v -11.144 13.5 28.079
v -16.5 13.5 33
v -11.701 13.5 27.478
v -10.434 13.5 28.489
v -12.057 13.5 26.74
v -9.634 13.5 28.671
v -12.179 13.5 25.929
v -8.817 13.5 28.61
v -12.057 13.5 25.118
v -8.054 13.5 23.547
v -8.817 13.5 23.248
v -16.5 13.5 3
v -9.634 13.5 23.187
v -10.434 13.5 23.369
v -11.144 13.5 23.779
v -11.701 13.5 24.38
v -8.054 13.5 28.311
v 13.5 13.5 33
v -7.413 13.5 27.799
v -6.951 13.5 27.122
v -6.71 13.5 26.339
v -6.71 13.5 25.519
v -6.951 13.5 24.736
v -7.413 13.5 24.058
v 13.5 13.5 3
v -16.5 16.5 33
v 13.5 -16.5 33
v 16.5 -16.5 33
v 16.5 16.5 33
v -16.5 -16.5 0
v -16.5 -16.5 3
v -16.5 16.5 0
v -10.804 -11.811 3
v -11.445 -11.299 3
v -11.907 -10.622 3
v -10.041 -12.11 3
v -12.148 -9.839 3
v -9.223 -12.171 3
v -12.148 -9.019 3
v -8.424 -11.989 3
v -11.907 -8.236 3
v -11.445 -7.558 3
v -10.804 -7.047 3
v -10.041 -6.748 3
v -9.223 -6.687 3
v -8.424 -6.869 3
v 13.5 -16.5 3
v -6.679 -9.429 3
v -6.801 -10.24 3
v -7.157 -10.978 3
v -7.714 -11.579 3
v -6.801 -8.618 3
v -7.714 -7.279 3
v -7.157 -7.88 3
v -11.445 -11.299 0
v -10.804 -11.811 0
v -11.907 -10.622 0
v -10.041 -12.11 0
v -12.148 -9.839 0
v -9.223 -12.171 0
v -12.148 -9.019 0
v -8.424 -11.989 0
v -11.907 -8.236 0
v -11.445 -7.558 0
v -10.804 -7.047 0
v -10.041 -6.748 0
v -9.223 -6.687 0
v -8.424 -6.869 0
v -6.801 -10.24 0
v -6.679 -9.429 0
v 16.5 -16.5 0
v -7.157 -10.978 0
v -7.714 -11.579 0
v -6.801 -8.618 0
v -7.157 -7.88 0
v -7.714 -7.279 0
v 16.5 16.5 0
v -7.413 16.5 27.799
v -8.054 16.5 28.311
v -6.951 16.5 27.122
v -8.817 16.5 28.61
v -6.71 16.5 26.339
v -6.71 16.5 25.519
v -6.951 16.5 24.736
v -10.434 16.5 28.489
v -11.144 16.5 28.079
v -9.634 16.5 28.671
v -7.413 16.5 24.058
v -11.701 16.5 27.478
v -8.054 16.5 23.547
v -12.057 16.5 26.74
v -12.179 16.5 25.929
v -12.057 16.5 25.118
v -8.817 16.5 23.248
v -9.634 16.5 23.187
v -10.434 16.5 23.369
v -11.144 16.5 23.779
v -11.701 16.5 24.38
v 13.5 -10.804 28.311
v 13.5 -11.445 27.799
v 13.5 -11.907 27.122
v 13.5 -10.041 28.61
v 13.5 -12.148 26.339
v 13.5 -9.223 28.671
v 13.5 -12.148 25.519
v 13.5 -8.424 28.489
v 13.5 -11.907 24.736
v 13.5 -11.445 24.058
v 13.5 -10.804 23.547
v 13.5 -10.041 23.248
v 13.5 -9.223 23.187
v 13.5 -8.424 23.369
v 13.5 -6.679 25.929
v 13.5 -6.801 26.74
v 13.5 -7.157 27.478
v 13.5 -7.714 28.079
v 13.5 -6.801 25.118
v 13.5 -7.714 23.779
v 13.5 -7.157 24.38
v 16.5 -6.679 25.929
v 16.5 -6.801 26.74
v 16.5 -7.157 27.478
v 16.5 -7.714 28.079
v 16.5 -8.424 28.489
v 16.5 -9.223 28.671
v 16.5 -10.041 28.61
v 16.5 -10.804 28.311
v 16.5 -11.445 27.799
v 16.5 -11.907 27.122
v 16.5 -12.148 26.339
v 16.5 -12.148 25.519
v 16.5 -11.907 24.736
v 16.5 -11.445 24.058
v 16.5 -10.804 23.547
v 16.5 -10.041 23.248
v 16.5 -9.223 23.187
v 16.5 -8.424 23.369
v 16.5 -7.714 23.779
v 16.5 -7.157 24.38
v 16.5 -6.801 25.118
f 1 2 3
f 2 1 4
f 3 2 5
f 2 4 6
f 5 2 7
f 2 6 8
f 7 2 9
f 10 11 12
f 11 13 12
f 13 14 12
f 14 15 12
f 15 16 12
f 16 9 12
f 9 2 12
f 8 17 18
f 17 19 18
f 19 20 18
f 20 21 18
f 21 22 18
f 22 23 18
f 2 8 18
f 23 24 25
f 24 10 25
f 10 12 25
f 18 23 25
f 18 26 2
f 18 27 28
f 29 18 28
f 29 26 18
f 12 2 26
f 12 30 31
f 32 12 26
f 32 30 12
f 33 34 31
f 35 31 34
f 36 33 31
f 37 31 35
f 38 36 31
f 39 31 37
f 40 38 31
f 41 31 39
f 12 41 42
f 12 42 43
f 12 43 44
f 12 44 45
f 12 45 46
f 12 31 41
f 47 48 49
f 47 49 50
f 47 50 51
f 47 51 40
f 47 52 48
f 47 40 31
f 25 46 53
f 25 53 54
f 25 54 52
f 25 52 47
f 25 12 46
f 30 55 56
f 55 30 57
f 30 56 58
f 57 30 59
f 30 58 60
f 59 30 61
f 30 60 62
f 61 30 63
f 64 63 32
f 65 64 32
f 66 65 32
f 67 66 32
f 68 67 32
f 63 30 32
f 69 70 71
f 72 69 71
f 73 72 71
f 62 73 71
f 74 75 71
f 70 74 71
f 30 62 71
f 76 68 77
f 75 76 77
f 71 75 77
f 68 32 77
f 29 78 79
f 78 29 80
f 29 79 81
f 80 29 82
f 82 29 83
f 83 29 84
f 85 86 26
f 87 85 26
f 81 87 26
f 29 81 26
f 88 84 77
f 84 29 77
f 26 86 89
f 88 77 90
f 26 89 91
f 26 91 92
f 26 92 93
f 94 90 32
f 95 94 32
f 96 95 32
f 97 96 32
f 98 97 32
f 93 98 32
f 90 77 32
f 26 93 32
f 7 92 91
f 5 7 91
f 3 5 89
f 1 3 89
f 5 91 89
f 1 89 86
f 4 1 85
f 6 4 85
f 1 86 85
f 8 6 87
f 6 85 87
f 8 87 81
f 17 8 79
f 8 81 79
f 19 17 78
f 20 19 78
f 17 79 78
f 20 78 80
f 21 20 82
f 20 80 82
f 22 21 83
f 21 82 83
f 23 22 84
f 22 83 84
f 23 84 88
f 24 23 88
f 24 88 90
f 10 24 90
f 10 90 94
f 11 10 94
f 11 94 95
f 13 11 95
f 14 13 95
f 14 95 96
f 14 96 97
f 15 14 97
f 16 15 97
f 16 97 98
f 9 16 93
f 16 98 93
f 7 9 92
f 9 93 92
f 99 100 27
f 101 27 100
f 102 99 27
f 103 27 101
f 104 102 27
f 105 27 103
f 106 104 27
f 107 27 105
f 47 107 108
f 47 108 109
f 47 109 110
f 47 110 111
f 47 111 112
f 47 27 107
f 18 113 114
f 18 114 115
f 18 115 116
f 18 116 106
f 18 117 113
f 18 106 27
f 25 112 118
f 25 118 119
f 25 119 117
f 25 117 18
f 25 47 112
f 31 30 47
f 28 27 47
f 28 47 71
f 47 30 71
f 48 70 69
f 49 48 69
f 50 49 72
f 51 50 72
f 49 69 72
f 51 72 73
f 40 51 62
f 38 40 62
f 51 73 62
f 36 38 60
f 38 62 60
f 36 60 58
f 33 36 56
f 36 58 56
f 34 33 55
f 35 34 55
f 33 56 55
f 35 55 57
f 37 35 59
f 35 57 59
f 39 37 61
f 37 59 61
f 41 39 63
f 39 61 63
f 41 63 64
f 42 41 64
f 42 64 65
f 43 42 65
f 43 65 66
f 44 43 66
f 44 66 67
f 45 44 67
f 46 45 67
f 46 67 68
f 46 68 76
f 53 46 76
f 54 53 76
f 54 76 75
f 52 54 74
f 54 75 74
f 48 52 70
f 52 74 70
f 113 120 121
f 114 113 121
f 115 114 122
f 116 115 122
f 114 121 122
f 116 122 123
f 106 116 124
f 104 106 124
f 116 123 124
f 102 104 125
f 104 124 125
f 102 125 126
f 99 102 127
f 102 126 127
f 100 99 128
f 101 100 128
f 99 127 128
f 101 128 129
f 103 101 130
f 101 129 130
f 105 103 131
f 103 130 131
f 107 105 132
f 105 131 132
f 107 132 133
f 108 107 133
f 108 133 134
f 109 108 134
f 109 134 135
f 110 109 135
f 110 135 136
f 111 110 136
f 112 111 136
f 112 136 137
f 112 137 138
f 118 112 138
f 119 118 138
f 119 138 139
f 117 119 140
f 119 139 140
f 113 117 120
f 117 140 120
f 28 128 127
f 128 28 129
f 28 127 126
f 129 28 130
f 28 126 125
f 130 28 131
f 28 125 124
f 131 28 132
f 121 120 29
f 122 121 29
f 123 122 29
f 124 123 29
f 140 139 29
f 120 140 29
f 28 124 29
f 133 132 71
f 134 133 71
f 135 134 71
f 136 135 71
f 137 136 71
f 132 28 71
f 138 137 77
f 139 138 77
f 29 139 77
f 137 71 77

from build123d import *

# Parameters (mm, degrees)
F0_W     = 33
F0_H     = 33
F1_DEPTH = 3
F2_W     = 30
F2_H     = 3
F2_W_2   = 3
F2_H_2   = 30
F3_DEPTH = 30
F6_R     = 2.75
F7_DEPTH = 3
F4_R     = 2.75
F8_DEPTH = 3
F5_R     = 2.75
F9_DEPTH = 3


with BuildPart() as f1:
    # F0 (on Top) → F1 (new body)
    with BuildSketch(Plane.XY):
        Rectangle(F0_W, F0_H)
    extrude(amount=F1_DEPTH)

    # F2 (on face) → F3 (join)
    with BuildSketch(Plane.XY.offset(3)):
        with Locations((-1.5, 15)):
            Rectangle(F2_W, F2_H)
        with Locations((15, 15)):
            Rectangle(F2_W_2, F2_H)
        with Locations((15, -1.5)):
            Rectangle(F2_W_2, F2_H_2)
    extrude(amount=F3_DEPTH)

    # F6 (on face) → F7 (cut)
    with BuildSketch(Plane(origin=(0, 16.5, 0), x_dir=(-1, 0, 0), z_dir=(0, 1, 0))):
        with Locations((9.428932, 25.928932)):
            Circle(F6_R)
    extrude(amount=-F7_DEPTH, mode=Mode.SUBTRACT)

    # F4 (on face) → F8 (cut)
    with BuildSketch(Plane(origin=(0, 0, 0), x_dir=(1, 0, 0), z_dir=(0, 0, -1))):
        with Locations((-9.428932, 9.428932)):
            Circle(F4_R)
    extrude(amount=-F8_DEPTH, mode=Mode.SUBTRACT)

    # F5 (on face) → F9 (cut)
    with BuildSketch(Plane.YZ.offset(16.5)):
        with Locations((-9.428932, 25.928932)):
            Circle(F5_R)
    extrude(amount=-F9_DEPTH, mode=Mode.SUBTRACT)


solid = f1.part
